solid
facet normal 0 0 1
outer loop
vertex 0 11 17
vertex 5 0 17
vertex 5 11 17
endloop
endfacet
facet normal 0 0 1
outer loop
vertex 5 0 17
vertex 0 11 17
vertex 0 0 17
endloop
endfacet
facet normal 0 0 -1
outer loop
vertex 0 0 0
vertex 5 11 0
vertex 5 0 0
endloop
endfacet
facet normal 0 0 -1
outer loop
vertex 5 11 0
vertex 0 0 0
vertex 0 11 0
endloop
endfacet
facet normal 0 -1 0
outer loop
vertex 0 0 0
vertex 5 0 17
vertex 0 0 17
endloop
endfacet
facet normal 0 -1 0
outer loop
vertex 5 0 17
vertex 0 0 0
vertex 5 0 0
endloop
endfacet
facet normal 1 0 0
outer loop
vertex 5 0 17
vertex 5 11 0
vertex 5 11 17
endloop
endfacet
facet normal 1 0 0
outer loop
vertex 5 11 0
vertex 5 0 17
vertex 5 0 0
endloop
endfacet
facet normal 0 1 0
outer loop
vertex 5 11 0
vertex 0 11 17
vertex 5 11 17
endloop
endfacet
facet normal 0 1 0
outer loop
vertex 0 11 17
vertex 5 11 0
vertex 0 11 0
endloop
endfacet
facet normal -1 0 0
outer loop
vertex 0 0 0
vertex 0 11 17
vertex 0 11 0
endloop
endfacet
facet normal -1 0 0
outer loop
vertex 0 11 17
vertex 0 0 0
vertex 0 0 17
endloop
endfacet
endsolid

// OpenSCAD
// Generated by SolidPython 1.0.1 on 2020-07-29 00:39:26


cube(size = [5, 11, 17]);
/***********************************************
*********      SolidPython code:      **********
************************************************
 
# import packages: SolidPython
from solid import *
from solid.utils import *
from itertools import chain, combinations


class Resize:

    def __init__(self, scad_file):
        self.scad_file = scad_file
        #self.scad_file = import_scad(scad_file)
        # cone/cylinder param:
        self.r1 = 0
        self.r2 = 0
        self.h = 0
        # rectangular prism param:
        self.w = 0
        self.l = 0
        # ellipse param:
        self.r = 0

    # import OpenScad code (file name corresponds to shape)


    # classify shape + parameters
    def assign(self, param1, param2, param3):
        if self.scad_file == 'cone.scad':
            self.r1 = param1
            self.r2 = param2
            self.h = param3
        elif self.scad_file == 'cylinder.scad':
            self.r1 = param1
            self.r2 = param2
            self.h = param3
        elif self.scad_file == 'rectangularPrism.scad':
            self.h = param1
            self.l = param2
            self.w = param3
        else:
            self.r = param1
            self.h = param2

    # resize parameters
    def iterate(self):
        x = range(3, 20, 2)
        i = 1
        if self.scad_file == 'cone.scad':
            tempList = list(combinations(x, 2))
            for temp in tempList:
                param1 = temp[0]
                param2 = temp[1]
                filepath = 'produced_scad_files/' + 'cone' + str(param1) + '_' + str(param2) + '_' + '.scad'
                scad_render_to_file(cylinder(h=param1, r1=param2, r2=0), filepath)

        elif self.scad_file == 'cylinder.scad':
            tempList = list(combinations(x, 3))
            for temp in tempList:
                param1 = temp[0]
                param2 = temp[1]
                filepath = 'produced_scad_files/' + 'cylinder' + str(param1) + '_' + str(param2) + '_' + '.scad'
                scad_render_to_file(cylinder(h=param1, r1=param2, r2=param2), filepath)

        elif self.scad_file == 'rectangularPrism.scad':
            tempList = list(combinations(x, 3))
            for temp in tempList:
                param1 = temp[0]
                param2 = temp[1]
                param3 = temp[2]
                filepath = 'produced_scad_files/' + 'rectangularPrism' + str(param1) + '_' + str(param2) + '_' + str(
                    param3) + '.scad'
                scad_render_to_file(cube(size=(param1, param2, param3)), filepath)

        elif self.scad_file == 'ellipse.scad':
            tempList = list(combinations(x, 4))
            for temp in tempList:
                param1 = temp[0]
                param2 = temp[1]
                param3 = temp[2]
                param4 = temp[3]
                filepath = 'produced_scad_files/' + 'ellipse' + str(param1) + '_' + str(param2) + '_' + str(param3) + '_' + str(param4) + '.scad'
                scad_render_to_file(scale([param1, param2, param3])(sphere(r=param4)), filepath)

    def render_to_scadfile(self):
        scad_render_to_file(scad, 'example.scad') 
 
************************************************/
